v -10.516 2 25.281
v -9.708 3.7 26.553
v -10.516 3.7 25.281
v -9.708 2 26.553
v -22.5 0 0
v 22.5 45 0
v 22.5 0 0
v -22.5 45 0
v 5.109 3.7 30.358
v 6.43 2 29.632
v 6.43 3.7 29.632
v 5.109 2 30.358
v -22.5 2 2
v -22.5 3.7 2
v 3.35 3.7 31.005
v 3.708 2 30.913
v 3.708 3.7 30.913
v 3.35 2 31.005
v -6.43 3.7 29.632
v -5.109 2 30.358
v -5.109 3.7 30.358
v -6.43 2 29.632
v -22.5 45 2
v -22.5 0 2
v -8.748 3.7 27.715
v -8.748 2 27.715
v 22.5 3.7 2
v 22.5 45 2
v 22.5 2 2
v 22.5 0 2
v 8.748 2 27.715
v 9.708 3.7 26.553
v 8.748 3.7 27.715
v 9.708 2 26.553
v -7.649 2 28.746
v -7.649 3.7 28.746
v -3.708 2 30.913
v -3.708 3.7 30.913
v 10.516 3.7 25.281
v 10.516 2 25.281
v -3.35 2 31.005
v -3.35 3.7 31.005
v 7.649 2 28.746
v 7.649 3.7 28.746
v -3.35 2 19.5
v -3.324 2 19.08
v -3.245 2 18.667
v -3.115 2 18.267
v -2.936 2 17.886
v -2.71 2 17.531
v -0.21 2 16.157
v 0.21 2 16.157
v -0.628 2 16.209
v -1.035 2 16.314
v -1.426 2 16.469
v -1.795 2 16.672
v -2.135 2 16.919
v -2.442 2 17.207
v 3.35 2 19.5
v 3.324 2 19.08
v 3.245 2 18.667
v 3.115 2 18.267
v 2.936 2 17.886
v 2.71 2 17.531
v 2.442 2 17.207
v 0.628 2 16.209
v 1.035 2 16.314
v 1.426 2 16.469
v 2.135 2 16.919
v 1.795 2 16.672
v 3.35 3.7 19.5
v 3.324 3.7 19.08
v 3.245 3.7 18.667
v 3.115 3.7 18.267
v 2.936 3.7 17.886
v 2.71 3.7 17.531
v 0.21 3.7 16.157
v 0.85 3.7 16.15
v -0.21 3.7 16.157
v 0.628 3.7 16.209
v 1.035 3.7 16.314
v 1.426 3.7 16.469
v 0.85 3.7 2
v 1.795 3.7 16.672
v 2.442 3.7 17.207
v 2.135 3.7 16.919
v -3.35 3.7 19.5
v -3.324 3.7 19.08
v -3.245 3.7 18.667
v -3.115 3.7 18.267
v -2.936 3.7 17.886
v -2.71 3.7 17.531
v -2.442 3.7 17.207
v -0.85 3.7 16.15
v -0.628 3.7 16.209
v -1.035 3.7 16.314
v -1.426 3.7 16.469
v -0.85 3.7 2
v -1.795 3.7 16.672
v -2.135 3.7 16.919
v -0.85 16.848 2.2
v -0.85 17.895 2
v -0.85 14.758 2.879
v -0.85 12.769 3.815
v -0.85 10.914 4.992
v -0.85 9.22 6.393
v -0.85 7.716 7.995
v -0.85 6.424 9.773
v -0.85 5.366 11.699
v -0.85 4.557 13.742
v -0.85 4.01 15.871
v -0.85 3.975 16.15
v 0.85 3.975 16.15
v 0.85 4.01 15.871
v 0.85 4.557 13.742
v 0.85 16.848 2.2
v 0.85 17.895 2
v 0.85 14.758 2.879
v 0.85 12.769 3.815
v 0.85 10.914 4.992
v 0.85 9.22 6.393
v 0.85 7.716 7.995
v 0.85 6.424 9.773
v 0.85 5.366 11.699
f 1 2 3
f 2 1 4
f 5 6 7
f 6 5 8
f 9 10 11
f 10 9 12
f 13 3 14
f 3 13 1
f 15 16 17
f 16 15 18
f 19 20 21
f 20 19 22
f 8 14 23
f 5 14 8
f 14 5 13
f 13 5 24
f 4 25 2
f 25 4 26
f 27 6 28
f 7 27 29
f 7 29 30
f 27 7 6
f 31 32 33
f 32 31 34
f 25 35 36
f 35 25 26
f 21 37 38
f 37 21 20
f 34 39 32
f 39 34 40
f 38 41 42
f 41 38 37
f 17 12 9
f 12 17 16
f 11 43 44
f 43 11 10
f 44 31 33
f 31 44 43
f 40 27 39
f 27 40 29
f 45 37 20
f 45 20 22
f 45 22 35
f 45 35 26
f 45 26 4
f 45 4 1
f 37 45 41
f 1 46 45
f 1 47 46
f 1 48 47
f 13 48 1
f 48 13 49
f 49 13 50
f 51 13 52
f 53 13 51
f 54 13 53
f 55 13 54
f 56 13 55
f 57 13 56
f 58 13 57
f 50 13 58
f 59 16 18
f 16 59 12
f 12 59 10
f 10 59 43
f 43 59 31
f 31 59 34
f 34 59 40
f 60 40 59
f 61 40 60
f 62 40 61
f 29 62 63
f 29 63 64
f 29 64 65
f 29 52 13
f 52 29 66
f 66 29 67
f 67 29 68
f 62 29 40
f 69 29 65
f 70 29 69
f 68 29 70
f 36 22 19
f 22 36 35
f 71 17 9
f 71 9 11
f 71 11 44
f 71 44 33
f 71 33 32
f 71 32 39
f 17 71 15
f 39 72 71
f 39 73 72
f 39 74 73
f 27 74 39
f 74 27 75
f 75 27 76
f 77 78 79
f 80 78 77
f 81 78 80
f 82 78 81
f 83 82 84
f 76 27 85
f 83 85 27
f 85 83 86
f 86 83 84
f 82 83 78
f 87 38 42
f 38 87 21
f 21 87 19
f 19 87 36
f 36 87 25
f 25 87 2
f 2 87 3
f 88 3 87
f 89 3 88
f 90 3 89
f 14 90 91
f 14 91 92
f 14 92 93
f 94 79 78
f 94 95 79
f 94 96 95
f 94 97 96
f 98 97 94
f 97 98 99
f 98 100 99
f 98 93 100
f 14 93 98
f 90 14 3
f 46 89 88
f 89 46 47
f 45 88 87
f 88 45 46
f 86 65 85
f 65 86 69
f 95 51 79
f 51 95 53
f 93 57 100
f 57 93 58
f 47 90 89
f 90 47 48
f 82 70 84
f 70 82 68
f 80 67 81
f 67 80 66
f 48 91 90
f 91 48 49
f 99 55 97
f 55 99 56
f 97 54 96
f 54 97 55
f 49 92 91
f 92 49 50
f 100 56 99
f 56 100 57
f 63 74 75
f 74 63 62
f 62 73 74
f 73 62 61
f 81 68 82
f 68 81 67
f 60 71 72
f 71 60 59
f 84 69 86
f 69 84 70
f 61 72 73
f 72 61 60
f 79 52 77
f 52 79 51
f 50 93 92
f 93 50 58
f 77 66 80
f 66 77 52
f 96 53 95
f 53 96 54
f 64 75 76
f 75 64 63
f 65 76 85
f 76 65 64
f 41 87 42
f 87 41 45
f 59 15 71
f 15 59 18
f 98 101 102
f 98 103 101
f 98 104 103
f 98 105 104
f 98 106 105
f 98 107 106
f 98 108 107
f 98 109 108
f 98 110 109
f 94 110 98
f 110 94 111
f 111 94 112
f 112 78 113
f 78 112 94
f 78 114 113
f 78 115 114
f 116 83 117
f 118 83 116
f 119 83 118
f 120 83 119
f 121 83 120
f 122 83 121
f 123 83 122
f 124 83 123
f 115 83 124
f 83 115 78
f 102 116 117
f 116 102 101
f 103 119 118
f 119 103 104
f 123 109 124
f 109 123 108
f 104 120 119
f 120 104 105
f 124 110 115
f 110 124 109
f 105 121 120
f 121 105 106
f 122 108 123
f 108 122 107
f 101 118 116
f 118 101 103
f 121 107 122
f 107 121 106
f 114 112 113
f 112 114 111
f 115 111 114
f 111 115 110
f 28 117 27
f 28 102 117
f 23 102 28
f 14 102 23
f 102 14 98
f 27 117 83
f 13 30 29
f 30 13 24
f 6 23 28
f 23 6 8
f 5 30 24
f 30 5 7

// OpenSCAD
shelf_height=17.5;		//Height from center of "axle" Default 17.5
shelf_width=45;			// Default 45
shelf_length=45;		// Default 45
axle_diameter=6;		//Default 6
axle_width=1.7;			// Default 1.7
thickness=2;			// Default 2
//
number_x=1;		//////
number_y=1;		//////
//
distance_to_window=2;			// Default 2

tolerance=0.7;			// Default 0.7
cup_size=35;			// 




$fn=50;


module shelf()
{
// Shelf


translate([-shelf_width/2,0,shelf_height])
cube([shelf_width, shelf_length, thickness]);

difference()
{
hull()
{

// Suction Cup Connection


translate([0,distance_to_window + axle_width/2,0])
rotate([90,0,0])
cylinder(r=axle_diameter*2, h=axle_width, center=true);

// Legs


translate([-shelf_width/2, distance_to_window,shelf_height])
cube([shelf_width, axle_width, thickness]);


}

// Notch

translate([0,(distance_to_window + axle_width/2 ),0])
rotate([90,0,0])
cylinder(r=(axle_diameter + tolerance)/2, h=axle_width+2, center=true);


translate([-(axle_diameter+tolerance)/2, distance_to_window-1, -axle_diameter*2])
cube([axle_diameter + tolerance, axle_width+2, axle_diameter*2]);
}


// support

difference()
{

// FIX THIS FOR LARGER SHELF HEIGHT
translate([-axle_width/2,distance_to_window+axle_width,axle_diameter/2+tolerance/2])
cube([axle_width,cup_size/2+axle_diameter/2-thickness,shelf_height-(axle_diameter/2)]);


translate([0,shelf_height + distance_to_window + axle_width,tolerance/2])
rotate([0,90,0])
cylinder(r=shelf_height,h=axle_width+2, center=true);
}

}

//--------------------------------------------------------

for (i=[0:number_x-1], j=[0:number_y-1])
{

translate([i*(shelf_width+5), j*(shelf_length+5),shelf_height + thickness])
rotate([0,180,0])
shelf();


}
